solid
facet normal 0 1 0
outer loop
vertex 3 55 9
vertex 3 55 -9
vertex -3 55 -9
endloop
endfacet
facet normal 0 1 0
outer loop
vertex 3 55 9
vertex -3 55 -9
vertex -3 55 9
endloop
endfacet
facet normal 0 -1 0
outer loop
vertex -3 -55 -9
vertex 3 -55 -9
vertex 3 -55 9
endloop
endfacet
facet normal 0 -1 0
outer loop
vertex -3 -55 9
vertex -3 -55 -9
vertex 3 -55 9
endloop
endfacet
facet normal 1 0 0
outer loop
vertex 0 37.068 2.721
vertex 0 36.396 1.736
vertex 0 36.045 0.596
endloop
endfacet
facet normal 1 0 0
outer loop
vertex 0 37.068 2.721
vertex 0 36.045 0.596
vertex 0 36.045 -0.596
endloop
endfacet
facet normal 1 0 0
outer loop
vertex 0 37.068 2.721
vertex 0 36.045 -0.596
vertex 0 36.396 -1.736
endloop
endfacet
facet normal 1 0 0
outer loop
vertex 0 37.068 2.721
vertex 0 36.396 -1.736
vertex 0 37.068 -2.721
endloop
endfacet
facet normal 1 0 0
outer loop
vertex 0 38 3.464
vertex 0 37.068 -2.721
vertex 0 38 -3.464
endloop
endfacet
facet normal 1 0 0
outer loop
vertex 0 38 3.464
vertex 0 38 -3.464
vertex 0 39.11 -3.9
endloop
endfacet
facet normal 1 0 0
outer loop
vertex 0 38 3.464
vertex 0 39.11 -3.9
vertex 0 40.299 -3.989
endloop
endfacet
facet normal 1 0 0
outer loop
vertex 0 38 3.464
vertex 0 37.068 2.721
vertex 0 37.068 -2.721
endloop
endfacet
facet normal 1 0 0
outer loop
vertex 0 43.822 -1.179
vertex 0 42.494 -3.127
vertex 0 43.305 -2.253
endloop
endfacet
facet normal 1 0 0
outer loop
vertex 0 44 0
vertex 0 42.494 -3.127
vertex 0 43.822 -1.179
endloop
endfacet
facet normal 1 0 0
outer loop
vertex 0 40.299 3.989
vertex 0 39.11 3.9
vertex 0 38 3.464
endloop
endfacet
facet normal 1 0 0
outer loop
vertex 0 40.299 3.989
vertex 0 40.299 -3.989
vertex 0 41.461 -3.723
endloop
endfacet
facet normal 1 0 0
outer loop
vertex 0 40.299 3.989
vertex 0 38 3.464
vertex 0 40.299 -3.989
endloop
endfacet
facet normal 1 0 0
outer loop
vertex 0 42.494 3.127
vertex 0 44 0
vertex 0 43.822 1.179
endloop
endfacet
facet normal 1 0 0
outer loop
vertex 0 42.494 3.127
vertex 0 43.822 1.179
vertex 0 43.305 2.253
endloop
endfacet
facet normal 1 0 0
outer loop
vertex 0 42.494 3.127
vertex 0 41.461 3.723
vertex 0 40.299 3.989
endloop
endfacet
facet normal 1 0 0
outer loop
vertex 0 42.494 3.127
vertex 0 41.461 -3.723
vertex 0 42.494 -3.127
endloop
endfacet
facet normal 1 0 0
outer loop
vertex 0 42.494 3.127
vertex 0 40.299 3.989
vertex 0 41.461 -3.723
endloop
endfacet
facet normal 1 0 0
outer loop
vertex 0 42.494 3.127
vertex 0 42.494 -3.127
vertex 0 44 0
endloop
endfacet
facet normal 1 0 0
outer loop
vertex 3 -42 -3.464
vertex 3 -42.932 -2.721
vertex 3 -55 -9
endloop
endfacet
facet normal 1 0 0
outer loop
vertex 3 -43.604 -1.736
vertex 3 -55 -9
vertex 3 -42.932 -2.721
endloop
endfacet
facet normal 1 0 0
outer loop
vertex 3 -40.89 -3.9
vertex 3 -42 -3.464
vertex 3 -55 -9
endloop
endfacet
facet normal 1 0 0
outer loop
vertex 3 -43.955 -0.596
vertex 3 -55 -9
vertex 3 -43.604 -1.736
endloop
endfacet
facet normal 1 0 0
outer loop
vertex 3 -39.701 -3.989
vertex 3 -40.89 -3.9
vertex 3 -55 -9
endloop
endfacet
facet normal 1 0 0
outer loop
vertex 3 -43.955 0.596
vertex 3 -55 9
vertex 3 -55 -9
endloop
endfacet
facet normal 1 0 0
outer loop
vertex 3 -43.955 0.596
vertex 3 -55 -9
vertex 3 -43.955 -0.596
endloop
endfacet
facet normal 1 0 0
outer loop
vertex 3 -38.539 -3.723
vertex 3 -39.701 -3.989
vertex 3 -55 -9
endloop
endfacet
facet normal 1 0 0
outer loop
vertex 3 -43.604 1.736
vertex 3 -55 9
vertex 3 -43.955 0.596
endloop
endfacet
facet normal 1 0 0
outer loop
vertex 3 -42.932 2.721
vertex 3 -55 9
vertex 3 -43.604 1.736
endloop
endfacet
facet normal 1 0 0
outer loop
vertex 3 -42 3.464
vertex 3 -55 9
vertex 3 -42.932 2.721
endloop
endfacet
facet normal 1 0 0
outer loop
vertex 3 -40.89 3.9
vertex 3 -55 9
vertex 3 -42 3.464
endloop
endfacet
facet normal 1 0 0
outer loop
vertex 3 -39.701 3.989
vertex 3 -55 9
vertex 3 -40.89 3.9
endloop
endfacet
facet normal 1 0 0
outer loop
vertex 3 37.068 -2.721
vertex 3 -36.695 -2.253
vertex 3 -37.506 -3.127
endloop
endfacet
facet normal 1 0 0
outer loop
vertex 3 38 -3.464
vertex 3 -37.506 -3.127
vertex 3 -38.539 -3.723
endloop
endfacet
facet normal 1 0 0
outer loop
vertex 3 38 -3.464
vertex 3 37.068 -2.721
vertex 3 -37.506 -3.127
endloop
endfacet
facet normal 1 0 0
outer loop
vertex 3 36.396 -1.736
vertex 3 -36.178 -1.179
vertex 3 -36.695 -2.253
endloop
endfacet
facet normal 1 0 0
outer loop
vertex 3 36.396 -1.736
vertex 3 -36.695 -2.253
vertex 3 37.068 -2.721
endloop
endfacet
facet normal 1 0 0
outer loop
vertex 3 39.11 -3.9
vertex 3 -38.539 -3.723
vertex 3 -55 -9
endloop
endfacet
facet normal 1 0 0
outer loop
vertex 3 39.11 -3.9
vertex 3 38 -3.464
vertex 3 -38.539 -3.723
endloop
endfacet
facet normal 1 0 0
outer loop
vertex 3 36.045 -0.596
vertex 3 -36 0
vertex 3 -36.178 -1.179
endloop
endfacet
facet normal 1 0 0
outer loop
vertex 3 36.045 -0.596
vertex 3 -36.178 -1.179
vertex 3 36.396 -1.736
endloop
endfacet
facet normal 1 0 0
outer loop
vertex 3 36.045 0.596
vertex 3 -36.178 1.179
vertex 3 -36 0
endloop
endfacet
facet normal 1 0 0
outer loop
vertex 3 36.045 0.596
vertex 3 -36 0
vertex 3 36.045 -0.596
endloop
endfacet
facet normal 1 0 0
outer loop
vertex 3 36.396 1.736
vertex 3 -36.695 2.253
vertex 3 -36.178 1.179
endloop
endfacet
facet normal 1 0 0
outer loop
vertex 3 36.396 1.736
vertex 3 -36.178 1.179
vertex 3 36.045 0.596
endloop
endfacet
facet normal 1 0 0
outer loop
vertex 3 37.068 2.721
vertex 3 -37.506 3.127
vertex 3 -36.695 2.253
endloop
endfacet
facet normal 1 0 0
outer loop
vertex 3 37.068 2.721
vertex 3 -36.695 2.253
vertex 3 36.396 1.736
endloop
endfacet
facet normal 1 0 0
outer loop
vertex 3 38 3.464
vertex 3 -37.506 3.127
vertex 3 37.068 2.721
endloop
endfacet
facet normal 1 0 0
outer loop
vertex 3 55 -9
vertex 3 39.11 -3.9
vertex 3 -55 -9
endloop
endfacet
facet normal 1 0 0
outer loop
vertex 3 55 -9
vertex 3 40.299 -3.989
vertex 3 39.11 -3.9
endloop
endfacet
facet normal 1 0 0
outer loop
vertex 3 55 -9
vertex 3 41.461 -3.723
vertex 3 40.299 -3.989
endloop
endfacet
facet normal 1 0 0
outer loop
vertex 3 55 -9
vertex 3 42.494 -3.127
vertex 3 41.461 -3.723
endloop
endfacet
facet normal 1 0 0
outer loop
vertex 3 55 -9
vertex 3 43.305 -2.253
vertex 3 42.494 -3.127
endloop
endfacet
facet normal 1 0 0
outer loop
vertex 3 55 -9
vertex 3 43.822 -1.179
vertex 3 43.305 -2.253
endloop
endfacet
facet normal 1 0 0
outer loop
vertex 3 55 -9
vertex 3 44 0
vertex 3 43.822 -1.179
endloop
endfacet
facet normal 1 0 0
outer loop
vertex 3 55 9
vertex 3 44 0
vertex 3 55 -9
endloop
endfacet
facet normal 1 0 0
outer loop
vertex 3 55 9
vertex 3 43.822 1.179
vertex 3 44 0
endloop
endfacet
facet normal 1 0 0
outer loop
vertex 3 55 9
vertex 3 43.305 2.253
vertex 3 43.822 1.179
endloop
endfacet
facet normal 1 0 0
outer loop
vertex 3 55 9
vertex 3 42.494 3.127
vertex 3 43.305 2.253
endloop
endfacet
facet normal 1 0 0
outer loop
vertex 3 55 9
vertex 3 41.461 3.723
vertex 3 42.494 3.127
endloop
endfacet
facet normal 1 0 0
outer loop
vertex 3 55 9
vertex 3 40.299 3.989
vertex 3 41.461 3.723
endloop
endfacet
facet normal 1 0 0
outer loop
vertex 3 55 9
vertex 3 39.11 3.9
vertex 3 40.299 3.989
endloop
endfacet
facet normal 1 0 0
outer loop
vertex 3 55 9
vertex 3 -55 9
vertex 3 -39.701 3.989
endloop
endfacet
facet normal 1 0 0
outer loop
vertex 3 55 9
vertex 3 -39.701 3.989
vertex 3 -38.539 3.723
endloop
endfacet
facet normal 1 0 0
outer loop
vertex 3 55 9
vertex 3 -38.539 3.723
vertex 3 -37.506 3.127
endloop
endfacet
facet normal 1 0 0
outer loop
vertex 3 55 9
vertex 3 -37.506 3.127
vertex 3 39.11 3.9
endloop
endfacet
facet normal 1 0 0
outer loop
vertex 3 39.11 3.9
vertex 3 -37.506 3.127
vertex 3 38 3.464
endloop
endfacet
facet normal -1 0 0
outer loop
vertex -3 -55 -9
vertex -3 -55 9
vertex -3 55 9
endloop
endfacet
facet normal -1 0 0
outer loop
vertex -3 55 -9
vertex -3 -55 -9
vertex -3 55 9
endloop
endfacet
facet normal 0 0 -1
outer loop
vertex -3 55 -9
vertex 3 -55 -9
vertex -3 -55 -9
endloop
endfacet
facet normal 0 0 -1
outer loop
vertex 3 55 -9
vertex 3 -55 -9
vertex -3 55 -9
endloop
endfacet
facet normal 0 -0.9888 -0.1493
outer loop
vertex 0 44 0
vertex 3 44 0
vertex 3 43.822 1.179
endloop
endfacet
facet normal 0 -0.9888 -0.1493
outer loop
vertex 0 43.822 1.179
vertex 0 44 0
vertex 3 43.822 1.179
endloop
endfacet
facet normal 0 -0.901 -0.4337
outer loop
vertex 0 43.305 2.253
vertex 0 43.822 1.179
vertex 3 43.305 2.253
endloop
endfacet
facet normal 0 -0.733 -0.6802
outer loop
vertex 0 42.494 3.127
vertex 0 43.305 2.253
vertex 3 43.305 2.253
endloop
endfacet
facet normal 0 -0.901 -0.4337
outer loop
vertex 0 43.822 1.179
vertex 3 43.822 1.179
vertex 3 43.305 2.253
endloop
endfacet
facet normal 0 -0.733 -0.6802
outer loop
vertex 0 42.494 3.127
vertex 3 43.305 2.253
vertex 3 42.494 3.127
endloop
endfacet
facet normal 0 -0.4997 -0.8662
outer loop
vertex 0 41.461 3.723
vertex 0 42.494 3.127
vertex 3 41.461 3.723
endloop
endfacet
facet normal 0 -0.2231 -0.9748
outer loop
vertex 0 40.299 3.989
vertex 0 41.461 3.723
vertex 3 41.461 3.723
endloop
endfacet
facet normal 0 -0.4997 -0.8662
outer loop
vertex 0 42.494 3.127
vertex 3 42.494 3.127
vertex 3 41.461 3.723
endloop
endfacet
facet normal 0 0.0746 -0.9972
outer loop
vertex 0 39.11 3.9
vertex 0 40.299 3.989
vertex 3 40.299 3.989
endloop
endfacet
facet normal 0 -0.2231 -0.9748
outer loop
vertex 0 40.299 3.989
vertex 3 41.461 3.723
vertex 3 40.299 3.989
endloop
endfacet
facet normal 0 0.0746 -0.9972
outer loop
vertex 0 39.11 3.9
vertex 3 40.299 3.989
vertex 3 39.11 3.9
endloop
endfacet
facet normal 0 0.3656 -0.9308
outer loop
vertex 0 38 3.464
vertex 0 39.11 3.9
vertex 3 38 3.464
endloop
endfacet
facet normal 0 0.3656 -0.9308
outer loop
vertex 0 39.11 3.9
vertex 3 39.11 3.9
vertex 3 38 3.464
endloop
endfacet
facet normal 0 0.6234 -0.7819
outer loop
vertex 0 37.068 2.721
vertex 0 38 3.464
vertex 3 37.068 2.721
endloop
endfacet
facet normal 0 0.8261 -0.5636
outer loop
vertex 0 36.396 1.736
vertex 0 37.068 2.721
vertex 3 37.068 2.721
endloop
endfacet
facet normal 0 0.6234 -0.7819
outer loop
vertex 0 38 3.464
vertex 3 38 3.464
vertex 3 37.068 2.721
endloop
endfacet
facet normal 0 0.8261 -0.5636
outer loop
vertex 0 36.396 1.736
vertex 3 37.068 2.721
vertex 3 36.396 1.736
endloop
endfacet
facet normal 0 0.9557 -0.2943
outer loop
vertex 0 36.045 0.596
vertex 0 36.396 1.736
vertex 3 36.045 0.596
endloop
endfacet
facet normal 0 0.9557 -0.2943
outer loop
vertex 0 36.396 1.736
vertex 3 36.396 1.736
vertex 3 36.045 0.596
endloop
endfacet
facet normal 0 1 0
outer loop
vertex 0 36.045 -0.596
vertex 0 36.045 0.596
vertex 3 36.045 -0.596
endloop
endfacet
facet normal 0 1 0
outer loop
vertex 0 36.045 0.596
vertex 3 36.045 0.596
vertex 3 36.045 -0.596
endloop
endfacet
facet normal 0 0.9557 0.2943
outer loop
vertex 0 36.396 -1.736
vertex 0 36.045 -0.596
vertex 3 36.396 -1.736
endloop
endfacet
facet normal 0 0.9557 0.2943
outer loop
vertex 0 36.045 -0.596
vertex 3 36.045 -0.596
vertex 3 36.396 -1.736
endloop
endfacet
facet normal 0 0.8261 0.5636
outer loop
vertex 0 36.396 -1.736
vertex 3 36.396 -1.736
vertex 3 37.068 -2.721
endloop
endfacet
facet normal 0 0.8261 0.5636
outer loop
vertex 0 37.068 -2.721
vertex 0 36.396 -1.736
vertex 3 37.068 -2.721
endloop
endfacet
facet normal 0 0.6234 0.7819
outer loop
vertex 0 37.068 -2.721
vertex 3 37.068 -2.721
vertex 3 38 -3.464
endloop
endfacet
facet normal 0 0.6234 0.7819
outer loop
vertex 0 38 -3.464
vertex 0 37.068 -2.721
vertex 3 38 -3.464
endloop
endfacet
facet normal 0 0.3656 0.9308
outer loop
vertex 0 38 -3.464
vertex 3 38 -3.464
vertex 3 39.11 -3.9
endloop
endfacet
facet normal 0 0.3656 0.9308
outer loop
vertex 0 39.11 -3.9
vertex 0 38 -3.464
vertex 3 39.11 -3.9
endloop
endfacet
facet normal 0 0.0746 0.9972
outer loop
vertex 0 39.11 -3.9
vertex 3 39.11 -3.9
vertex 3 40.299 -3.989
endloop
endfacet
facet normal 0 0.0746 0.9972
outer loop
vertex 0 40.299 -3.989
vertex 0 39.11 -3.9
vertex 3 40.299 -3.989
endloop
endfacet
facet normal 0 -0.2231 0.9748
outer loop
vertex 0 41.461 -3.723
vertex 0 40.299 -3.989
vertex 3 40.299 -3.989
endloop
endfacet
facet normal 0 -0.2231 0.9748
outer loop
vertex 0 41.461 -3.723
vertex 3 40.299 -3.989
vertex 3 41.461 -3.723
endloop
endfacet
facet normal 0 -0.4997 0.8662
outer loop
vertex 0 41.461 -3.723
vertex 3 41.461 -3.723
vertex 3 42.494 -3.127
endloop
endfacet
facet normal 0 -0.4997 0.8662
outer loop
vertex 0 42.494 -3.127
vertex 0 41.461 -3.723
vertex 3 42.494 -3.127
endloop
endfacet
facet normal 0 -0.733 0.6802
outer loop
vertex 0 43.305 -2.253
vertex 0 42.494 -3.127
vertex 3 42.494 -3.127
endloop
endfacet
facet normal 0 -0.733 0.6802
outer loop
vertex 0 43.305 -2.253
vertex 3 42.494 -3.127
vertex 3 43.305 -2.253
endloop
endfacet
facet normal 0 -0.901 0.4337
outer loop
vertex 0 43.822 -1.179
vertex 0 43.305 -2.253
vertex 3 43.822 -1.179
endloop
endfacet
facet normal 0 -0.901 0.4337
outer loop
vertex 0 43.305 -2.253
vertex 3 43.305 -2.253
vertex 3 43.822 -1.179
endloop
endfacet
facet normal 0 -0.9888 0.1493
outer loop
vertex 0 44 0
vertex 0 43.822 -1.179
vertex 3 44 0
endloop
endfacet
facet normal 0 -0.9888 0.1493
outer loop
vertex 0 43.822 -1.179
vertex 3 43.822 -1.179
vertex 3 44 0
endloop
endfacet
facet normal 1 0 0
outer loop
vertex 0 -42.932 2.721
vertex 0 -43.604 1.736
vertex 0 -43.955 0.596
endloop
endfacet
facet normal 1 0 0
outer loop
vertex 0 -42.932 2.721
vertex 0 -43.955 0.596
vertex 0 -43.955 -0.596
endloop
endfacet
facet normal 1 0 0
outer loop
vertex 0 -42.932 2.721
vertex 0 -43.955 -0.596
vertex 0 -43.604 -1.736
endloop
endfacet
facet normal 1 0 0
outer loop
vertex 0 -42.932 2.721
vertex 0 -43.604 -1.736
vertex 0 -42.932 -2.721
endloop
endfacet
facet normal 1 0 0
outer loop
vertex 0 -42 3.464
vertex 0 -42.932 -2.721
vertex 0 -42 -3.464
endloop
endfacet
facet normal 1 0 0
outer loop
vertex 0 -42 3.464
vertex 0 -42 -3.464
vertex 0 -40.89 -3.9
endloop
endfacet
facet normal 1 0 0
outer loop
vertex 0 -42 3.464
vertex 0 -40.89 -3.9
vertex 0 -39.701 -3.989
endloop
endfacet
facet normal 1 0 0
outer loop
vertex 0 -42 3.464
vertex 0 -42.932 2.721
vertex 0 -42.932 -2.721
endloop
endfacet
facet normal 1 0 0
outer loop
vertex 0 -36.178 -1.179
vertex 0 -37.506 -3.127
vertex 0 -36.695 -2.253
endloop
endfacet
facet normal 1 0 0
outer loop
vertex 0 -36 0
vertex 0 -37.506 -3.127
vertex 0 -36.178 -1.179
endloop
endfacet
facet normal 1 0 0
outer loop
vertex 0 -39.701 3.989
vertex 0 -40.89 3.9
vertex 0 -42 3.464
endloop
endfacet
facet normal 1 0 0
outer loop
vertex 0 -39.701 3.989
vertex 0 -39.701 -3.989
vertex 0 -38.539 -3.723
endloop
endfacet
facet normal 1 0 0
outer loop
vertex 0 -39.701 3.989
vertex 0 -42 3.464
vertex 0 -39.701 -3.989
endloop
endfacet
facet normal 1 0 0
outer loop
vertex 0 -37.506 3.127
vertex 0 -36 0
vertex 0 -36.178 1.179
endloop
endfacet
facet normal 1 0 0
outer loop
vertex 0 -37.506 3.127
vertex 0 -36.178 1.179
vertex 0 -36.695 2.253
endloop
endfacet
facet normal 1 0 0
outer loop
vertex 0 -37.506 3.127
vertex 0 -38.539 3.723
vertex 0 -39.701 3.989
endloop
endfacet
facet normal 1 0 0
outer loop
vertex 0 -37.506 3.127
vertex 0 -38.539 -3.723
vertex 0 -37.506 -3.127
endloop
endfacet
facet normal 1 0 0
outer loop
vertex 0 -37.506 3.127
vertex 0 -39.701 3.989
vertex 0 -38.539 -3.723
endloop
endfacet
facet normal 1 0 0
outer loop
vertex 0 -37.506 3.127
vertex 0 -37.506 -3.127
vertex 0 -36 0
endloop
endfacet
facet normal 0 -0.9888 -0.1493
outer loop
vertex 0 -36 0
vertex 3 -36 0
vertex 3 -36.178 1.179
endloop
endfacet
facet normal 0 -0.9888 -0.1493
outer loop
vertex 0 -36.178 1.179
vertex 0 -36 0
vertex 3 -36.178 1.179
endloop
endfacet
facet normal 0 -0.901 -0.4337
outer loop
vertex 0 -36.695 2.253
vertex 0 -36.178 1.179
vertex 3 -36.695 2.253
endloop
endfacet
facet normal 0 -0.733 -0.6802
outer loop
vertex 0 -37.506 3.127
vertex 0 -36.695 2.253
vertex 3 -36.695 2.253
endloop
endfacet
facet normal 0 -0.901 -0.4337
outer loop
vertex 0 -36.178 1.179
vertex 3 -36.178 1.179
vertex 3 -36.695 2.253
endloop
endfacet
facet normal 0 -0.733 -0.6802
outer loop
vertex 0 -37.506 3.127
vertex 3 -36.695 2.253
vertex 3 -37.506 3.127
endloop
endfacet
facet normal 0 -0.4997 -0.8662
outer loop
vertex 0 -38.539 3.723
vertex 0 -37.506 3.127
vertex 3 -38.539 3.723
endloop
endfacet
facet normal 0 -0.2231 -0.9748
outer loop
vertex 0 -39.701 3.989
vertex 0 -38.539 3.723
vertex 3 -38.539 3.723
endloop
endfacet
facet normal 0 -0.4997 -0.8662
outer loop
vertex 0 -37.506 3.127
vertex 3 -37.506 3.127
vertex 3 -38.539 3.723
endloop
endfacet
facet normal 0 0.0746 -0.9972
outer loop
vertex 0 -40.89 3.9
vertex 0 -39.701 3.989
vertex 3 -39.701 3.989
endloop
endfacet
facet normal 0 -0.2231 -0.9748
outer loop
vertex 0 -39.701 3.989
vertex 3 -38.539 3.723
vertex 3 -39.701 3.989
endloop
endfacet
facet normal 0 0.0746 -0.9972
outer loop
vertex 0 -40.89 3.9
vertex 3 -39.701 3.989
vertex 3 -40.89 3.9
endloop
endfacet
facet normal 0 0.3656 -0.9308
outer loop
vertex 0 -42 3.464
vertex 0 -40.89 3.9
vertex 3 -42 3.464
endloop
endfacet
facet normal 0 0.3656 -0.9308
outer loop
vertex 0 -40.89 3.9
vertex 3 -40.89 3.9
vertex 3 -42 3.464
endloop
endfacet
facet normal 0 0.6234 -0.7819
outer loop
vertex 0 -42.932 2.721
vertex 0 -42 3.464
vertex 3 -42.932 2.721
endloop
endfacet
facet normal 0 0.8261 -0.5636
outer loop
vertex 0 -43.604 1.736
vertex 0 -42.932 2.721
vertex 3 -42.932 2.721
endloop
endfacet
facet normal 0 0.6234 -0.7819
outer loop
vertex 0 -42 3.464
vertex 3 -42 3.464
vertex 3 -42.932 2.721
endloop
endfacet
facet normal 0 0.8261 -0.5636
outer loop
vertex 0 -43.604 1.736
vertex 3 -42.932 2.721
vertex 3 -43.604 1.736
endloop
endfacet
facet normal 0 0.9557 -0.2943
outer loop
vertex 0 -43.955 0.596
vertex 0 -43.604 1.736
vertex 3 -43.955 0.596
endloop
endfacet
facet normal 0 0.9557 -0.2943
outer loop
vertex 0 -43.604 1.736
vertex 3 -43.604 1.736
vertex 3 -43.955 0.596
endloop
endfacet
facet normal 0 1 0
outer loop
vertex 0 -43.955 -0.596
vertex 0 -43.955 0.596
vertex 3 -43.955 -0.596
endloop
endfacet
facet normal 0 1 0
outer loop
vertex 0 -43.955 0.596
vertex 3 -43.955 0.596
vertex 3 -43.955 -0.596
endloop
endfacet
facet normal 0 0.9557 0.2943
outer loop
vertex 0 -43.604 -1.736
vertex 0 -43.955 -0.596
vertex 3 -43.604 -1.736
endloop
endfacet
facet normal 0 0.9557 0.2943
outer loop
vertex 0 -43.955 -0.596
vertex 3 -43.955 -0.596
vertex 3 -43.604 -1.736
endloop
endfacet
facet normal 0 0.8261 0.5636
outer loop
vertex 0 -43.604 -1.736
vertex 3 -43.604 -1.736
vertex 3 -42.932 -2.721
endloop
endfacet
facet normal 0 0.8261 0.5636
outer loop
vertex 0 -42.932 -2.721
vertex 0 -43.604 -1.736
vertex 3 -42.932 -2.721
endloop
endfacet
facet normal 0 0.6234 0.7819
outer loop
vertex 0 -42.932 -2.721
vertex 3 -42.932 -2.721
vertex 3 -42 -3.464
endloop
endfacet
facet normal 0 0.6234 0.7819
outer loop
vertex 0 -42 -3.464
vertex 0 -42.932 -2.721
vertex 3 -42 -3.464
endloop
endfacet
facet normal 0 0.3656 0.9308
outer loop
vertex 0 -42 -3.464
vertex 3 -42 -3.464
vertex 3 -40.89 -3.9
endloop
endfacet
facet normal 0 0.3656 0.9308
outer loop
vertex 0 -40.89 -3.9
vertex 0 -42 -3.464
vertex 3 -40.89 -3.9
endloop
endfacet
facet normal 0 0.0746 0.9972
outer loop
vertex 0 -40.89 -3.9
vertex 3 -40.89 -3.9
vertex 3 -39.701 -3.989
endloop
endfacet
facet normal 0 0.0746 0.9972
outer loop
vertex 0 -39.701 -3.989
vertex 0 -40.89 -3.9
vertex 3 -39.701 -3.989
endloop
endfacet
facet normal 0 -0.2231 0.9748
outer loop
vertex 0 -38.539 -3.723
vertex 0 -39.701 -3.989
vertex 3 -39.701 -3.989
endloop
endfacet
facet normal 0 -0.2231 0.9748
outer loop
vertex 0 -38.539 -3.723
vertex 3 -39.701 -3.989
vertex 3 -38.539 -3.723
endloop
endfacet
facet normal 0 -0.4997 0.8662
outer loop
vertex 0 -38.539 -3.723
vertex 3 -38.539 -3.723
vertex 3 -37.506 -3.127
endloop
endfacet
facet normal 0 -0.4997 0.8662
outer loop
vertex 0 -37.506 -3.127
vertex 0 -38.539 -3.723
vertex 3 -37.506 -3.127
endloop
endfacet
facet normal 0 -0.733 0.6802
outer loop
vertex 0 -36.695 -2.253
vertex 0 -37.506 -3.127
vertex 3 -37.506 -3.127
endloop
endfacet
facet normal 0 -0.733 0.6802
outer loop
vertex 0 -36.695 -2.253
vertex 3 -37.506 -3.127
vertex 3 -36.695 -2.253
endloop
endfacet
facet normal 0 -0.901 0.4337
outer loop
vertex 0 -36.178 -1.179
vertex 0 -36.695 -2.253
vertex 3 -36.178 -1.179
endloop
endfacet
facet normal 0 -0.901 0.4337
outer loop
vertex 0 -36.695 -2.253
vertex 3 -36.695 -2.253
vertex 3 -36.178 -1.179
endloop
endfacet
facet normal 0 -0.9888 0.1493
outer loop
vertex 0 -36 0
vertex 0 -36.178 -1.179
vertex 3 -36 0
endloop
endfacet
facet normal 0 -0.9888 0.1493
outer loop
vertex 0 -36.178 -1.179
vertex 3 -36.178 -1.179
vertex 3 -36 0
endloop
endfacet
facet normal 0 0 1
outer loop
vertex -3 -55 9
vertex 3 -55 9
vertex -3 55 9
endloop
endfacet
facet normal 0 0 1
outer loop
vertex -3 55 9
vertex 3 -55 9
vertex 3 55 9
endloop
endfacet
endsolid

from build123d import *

# Parameters (mm, degrees)
F0_W     = 110
F0_H     = 18
F1_DEPTH = 3
F2_R     = 4
F3_DEPTH = 3


with BuildPart() as f1:
    # F0 (on Right) → F1 (new body, symmetric)
    with BuildSketch(Plane.YZ):
        Rectangle(F0_W, F0_H)
    extrude(amount=F1_DEPTH, both=True)

    # F2 (on face) → F3 (cut)
    with BuildSketch(Plane.YZ.offset(3)):
        with Locations((-40, 0)):
            Circle(F2_R)
        with Locations((40, 0)):
            Circle(F2_R)
    extrude(amount=-F3_DEPTH, mode=Mode.SUBTRACT)


solid = f1.part
